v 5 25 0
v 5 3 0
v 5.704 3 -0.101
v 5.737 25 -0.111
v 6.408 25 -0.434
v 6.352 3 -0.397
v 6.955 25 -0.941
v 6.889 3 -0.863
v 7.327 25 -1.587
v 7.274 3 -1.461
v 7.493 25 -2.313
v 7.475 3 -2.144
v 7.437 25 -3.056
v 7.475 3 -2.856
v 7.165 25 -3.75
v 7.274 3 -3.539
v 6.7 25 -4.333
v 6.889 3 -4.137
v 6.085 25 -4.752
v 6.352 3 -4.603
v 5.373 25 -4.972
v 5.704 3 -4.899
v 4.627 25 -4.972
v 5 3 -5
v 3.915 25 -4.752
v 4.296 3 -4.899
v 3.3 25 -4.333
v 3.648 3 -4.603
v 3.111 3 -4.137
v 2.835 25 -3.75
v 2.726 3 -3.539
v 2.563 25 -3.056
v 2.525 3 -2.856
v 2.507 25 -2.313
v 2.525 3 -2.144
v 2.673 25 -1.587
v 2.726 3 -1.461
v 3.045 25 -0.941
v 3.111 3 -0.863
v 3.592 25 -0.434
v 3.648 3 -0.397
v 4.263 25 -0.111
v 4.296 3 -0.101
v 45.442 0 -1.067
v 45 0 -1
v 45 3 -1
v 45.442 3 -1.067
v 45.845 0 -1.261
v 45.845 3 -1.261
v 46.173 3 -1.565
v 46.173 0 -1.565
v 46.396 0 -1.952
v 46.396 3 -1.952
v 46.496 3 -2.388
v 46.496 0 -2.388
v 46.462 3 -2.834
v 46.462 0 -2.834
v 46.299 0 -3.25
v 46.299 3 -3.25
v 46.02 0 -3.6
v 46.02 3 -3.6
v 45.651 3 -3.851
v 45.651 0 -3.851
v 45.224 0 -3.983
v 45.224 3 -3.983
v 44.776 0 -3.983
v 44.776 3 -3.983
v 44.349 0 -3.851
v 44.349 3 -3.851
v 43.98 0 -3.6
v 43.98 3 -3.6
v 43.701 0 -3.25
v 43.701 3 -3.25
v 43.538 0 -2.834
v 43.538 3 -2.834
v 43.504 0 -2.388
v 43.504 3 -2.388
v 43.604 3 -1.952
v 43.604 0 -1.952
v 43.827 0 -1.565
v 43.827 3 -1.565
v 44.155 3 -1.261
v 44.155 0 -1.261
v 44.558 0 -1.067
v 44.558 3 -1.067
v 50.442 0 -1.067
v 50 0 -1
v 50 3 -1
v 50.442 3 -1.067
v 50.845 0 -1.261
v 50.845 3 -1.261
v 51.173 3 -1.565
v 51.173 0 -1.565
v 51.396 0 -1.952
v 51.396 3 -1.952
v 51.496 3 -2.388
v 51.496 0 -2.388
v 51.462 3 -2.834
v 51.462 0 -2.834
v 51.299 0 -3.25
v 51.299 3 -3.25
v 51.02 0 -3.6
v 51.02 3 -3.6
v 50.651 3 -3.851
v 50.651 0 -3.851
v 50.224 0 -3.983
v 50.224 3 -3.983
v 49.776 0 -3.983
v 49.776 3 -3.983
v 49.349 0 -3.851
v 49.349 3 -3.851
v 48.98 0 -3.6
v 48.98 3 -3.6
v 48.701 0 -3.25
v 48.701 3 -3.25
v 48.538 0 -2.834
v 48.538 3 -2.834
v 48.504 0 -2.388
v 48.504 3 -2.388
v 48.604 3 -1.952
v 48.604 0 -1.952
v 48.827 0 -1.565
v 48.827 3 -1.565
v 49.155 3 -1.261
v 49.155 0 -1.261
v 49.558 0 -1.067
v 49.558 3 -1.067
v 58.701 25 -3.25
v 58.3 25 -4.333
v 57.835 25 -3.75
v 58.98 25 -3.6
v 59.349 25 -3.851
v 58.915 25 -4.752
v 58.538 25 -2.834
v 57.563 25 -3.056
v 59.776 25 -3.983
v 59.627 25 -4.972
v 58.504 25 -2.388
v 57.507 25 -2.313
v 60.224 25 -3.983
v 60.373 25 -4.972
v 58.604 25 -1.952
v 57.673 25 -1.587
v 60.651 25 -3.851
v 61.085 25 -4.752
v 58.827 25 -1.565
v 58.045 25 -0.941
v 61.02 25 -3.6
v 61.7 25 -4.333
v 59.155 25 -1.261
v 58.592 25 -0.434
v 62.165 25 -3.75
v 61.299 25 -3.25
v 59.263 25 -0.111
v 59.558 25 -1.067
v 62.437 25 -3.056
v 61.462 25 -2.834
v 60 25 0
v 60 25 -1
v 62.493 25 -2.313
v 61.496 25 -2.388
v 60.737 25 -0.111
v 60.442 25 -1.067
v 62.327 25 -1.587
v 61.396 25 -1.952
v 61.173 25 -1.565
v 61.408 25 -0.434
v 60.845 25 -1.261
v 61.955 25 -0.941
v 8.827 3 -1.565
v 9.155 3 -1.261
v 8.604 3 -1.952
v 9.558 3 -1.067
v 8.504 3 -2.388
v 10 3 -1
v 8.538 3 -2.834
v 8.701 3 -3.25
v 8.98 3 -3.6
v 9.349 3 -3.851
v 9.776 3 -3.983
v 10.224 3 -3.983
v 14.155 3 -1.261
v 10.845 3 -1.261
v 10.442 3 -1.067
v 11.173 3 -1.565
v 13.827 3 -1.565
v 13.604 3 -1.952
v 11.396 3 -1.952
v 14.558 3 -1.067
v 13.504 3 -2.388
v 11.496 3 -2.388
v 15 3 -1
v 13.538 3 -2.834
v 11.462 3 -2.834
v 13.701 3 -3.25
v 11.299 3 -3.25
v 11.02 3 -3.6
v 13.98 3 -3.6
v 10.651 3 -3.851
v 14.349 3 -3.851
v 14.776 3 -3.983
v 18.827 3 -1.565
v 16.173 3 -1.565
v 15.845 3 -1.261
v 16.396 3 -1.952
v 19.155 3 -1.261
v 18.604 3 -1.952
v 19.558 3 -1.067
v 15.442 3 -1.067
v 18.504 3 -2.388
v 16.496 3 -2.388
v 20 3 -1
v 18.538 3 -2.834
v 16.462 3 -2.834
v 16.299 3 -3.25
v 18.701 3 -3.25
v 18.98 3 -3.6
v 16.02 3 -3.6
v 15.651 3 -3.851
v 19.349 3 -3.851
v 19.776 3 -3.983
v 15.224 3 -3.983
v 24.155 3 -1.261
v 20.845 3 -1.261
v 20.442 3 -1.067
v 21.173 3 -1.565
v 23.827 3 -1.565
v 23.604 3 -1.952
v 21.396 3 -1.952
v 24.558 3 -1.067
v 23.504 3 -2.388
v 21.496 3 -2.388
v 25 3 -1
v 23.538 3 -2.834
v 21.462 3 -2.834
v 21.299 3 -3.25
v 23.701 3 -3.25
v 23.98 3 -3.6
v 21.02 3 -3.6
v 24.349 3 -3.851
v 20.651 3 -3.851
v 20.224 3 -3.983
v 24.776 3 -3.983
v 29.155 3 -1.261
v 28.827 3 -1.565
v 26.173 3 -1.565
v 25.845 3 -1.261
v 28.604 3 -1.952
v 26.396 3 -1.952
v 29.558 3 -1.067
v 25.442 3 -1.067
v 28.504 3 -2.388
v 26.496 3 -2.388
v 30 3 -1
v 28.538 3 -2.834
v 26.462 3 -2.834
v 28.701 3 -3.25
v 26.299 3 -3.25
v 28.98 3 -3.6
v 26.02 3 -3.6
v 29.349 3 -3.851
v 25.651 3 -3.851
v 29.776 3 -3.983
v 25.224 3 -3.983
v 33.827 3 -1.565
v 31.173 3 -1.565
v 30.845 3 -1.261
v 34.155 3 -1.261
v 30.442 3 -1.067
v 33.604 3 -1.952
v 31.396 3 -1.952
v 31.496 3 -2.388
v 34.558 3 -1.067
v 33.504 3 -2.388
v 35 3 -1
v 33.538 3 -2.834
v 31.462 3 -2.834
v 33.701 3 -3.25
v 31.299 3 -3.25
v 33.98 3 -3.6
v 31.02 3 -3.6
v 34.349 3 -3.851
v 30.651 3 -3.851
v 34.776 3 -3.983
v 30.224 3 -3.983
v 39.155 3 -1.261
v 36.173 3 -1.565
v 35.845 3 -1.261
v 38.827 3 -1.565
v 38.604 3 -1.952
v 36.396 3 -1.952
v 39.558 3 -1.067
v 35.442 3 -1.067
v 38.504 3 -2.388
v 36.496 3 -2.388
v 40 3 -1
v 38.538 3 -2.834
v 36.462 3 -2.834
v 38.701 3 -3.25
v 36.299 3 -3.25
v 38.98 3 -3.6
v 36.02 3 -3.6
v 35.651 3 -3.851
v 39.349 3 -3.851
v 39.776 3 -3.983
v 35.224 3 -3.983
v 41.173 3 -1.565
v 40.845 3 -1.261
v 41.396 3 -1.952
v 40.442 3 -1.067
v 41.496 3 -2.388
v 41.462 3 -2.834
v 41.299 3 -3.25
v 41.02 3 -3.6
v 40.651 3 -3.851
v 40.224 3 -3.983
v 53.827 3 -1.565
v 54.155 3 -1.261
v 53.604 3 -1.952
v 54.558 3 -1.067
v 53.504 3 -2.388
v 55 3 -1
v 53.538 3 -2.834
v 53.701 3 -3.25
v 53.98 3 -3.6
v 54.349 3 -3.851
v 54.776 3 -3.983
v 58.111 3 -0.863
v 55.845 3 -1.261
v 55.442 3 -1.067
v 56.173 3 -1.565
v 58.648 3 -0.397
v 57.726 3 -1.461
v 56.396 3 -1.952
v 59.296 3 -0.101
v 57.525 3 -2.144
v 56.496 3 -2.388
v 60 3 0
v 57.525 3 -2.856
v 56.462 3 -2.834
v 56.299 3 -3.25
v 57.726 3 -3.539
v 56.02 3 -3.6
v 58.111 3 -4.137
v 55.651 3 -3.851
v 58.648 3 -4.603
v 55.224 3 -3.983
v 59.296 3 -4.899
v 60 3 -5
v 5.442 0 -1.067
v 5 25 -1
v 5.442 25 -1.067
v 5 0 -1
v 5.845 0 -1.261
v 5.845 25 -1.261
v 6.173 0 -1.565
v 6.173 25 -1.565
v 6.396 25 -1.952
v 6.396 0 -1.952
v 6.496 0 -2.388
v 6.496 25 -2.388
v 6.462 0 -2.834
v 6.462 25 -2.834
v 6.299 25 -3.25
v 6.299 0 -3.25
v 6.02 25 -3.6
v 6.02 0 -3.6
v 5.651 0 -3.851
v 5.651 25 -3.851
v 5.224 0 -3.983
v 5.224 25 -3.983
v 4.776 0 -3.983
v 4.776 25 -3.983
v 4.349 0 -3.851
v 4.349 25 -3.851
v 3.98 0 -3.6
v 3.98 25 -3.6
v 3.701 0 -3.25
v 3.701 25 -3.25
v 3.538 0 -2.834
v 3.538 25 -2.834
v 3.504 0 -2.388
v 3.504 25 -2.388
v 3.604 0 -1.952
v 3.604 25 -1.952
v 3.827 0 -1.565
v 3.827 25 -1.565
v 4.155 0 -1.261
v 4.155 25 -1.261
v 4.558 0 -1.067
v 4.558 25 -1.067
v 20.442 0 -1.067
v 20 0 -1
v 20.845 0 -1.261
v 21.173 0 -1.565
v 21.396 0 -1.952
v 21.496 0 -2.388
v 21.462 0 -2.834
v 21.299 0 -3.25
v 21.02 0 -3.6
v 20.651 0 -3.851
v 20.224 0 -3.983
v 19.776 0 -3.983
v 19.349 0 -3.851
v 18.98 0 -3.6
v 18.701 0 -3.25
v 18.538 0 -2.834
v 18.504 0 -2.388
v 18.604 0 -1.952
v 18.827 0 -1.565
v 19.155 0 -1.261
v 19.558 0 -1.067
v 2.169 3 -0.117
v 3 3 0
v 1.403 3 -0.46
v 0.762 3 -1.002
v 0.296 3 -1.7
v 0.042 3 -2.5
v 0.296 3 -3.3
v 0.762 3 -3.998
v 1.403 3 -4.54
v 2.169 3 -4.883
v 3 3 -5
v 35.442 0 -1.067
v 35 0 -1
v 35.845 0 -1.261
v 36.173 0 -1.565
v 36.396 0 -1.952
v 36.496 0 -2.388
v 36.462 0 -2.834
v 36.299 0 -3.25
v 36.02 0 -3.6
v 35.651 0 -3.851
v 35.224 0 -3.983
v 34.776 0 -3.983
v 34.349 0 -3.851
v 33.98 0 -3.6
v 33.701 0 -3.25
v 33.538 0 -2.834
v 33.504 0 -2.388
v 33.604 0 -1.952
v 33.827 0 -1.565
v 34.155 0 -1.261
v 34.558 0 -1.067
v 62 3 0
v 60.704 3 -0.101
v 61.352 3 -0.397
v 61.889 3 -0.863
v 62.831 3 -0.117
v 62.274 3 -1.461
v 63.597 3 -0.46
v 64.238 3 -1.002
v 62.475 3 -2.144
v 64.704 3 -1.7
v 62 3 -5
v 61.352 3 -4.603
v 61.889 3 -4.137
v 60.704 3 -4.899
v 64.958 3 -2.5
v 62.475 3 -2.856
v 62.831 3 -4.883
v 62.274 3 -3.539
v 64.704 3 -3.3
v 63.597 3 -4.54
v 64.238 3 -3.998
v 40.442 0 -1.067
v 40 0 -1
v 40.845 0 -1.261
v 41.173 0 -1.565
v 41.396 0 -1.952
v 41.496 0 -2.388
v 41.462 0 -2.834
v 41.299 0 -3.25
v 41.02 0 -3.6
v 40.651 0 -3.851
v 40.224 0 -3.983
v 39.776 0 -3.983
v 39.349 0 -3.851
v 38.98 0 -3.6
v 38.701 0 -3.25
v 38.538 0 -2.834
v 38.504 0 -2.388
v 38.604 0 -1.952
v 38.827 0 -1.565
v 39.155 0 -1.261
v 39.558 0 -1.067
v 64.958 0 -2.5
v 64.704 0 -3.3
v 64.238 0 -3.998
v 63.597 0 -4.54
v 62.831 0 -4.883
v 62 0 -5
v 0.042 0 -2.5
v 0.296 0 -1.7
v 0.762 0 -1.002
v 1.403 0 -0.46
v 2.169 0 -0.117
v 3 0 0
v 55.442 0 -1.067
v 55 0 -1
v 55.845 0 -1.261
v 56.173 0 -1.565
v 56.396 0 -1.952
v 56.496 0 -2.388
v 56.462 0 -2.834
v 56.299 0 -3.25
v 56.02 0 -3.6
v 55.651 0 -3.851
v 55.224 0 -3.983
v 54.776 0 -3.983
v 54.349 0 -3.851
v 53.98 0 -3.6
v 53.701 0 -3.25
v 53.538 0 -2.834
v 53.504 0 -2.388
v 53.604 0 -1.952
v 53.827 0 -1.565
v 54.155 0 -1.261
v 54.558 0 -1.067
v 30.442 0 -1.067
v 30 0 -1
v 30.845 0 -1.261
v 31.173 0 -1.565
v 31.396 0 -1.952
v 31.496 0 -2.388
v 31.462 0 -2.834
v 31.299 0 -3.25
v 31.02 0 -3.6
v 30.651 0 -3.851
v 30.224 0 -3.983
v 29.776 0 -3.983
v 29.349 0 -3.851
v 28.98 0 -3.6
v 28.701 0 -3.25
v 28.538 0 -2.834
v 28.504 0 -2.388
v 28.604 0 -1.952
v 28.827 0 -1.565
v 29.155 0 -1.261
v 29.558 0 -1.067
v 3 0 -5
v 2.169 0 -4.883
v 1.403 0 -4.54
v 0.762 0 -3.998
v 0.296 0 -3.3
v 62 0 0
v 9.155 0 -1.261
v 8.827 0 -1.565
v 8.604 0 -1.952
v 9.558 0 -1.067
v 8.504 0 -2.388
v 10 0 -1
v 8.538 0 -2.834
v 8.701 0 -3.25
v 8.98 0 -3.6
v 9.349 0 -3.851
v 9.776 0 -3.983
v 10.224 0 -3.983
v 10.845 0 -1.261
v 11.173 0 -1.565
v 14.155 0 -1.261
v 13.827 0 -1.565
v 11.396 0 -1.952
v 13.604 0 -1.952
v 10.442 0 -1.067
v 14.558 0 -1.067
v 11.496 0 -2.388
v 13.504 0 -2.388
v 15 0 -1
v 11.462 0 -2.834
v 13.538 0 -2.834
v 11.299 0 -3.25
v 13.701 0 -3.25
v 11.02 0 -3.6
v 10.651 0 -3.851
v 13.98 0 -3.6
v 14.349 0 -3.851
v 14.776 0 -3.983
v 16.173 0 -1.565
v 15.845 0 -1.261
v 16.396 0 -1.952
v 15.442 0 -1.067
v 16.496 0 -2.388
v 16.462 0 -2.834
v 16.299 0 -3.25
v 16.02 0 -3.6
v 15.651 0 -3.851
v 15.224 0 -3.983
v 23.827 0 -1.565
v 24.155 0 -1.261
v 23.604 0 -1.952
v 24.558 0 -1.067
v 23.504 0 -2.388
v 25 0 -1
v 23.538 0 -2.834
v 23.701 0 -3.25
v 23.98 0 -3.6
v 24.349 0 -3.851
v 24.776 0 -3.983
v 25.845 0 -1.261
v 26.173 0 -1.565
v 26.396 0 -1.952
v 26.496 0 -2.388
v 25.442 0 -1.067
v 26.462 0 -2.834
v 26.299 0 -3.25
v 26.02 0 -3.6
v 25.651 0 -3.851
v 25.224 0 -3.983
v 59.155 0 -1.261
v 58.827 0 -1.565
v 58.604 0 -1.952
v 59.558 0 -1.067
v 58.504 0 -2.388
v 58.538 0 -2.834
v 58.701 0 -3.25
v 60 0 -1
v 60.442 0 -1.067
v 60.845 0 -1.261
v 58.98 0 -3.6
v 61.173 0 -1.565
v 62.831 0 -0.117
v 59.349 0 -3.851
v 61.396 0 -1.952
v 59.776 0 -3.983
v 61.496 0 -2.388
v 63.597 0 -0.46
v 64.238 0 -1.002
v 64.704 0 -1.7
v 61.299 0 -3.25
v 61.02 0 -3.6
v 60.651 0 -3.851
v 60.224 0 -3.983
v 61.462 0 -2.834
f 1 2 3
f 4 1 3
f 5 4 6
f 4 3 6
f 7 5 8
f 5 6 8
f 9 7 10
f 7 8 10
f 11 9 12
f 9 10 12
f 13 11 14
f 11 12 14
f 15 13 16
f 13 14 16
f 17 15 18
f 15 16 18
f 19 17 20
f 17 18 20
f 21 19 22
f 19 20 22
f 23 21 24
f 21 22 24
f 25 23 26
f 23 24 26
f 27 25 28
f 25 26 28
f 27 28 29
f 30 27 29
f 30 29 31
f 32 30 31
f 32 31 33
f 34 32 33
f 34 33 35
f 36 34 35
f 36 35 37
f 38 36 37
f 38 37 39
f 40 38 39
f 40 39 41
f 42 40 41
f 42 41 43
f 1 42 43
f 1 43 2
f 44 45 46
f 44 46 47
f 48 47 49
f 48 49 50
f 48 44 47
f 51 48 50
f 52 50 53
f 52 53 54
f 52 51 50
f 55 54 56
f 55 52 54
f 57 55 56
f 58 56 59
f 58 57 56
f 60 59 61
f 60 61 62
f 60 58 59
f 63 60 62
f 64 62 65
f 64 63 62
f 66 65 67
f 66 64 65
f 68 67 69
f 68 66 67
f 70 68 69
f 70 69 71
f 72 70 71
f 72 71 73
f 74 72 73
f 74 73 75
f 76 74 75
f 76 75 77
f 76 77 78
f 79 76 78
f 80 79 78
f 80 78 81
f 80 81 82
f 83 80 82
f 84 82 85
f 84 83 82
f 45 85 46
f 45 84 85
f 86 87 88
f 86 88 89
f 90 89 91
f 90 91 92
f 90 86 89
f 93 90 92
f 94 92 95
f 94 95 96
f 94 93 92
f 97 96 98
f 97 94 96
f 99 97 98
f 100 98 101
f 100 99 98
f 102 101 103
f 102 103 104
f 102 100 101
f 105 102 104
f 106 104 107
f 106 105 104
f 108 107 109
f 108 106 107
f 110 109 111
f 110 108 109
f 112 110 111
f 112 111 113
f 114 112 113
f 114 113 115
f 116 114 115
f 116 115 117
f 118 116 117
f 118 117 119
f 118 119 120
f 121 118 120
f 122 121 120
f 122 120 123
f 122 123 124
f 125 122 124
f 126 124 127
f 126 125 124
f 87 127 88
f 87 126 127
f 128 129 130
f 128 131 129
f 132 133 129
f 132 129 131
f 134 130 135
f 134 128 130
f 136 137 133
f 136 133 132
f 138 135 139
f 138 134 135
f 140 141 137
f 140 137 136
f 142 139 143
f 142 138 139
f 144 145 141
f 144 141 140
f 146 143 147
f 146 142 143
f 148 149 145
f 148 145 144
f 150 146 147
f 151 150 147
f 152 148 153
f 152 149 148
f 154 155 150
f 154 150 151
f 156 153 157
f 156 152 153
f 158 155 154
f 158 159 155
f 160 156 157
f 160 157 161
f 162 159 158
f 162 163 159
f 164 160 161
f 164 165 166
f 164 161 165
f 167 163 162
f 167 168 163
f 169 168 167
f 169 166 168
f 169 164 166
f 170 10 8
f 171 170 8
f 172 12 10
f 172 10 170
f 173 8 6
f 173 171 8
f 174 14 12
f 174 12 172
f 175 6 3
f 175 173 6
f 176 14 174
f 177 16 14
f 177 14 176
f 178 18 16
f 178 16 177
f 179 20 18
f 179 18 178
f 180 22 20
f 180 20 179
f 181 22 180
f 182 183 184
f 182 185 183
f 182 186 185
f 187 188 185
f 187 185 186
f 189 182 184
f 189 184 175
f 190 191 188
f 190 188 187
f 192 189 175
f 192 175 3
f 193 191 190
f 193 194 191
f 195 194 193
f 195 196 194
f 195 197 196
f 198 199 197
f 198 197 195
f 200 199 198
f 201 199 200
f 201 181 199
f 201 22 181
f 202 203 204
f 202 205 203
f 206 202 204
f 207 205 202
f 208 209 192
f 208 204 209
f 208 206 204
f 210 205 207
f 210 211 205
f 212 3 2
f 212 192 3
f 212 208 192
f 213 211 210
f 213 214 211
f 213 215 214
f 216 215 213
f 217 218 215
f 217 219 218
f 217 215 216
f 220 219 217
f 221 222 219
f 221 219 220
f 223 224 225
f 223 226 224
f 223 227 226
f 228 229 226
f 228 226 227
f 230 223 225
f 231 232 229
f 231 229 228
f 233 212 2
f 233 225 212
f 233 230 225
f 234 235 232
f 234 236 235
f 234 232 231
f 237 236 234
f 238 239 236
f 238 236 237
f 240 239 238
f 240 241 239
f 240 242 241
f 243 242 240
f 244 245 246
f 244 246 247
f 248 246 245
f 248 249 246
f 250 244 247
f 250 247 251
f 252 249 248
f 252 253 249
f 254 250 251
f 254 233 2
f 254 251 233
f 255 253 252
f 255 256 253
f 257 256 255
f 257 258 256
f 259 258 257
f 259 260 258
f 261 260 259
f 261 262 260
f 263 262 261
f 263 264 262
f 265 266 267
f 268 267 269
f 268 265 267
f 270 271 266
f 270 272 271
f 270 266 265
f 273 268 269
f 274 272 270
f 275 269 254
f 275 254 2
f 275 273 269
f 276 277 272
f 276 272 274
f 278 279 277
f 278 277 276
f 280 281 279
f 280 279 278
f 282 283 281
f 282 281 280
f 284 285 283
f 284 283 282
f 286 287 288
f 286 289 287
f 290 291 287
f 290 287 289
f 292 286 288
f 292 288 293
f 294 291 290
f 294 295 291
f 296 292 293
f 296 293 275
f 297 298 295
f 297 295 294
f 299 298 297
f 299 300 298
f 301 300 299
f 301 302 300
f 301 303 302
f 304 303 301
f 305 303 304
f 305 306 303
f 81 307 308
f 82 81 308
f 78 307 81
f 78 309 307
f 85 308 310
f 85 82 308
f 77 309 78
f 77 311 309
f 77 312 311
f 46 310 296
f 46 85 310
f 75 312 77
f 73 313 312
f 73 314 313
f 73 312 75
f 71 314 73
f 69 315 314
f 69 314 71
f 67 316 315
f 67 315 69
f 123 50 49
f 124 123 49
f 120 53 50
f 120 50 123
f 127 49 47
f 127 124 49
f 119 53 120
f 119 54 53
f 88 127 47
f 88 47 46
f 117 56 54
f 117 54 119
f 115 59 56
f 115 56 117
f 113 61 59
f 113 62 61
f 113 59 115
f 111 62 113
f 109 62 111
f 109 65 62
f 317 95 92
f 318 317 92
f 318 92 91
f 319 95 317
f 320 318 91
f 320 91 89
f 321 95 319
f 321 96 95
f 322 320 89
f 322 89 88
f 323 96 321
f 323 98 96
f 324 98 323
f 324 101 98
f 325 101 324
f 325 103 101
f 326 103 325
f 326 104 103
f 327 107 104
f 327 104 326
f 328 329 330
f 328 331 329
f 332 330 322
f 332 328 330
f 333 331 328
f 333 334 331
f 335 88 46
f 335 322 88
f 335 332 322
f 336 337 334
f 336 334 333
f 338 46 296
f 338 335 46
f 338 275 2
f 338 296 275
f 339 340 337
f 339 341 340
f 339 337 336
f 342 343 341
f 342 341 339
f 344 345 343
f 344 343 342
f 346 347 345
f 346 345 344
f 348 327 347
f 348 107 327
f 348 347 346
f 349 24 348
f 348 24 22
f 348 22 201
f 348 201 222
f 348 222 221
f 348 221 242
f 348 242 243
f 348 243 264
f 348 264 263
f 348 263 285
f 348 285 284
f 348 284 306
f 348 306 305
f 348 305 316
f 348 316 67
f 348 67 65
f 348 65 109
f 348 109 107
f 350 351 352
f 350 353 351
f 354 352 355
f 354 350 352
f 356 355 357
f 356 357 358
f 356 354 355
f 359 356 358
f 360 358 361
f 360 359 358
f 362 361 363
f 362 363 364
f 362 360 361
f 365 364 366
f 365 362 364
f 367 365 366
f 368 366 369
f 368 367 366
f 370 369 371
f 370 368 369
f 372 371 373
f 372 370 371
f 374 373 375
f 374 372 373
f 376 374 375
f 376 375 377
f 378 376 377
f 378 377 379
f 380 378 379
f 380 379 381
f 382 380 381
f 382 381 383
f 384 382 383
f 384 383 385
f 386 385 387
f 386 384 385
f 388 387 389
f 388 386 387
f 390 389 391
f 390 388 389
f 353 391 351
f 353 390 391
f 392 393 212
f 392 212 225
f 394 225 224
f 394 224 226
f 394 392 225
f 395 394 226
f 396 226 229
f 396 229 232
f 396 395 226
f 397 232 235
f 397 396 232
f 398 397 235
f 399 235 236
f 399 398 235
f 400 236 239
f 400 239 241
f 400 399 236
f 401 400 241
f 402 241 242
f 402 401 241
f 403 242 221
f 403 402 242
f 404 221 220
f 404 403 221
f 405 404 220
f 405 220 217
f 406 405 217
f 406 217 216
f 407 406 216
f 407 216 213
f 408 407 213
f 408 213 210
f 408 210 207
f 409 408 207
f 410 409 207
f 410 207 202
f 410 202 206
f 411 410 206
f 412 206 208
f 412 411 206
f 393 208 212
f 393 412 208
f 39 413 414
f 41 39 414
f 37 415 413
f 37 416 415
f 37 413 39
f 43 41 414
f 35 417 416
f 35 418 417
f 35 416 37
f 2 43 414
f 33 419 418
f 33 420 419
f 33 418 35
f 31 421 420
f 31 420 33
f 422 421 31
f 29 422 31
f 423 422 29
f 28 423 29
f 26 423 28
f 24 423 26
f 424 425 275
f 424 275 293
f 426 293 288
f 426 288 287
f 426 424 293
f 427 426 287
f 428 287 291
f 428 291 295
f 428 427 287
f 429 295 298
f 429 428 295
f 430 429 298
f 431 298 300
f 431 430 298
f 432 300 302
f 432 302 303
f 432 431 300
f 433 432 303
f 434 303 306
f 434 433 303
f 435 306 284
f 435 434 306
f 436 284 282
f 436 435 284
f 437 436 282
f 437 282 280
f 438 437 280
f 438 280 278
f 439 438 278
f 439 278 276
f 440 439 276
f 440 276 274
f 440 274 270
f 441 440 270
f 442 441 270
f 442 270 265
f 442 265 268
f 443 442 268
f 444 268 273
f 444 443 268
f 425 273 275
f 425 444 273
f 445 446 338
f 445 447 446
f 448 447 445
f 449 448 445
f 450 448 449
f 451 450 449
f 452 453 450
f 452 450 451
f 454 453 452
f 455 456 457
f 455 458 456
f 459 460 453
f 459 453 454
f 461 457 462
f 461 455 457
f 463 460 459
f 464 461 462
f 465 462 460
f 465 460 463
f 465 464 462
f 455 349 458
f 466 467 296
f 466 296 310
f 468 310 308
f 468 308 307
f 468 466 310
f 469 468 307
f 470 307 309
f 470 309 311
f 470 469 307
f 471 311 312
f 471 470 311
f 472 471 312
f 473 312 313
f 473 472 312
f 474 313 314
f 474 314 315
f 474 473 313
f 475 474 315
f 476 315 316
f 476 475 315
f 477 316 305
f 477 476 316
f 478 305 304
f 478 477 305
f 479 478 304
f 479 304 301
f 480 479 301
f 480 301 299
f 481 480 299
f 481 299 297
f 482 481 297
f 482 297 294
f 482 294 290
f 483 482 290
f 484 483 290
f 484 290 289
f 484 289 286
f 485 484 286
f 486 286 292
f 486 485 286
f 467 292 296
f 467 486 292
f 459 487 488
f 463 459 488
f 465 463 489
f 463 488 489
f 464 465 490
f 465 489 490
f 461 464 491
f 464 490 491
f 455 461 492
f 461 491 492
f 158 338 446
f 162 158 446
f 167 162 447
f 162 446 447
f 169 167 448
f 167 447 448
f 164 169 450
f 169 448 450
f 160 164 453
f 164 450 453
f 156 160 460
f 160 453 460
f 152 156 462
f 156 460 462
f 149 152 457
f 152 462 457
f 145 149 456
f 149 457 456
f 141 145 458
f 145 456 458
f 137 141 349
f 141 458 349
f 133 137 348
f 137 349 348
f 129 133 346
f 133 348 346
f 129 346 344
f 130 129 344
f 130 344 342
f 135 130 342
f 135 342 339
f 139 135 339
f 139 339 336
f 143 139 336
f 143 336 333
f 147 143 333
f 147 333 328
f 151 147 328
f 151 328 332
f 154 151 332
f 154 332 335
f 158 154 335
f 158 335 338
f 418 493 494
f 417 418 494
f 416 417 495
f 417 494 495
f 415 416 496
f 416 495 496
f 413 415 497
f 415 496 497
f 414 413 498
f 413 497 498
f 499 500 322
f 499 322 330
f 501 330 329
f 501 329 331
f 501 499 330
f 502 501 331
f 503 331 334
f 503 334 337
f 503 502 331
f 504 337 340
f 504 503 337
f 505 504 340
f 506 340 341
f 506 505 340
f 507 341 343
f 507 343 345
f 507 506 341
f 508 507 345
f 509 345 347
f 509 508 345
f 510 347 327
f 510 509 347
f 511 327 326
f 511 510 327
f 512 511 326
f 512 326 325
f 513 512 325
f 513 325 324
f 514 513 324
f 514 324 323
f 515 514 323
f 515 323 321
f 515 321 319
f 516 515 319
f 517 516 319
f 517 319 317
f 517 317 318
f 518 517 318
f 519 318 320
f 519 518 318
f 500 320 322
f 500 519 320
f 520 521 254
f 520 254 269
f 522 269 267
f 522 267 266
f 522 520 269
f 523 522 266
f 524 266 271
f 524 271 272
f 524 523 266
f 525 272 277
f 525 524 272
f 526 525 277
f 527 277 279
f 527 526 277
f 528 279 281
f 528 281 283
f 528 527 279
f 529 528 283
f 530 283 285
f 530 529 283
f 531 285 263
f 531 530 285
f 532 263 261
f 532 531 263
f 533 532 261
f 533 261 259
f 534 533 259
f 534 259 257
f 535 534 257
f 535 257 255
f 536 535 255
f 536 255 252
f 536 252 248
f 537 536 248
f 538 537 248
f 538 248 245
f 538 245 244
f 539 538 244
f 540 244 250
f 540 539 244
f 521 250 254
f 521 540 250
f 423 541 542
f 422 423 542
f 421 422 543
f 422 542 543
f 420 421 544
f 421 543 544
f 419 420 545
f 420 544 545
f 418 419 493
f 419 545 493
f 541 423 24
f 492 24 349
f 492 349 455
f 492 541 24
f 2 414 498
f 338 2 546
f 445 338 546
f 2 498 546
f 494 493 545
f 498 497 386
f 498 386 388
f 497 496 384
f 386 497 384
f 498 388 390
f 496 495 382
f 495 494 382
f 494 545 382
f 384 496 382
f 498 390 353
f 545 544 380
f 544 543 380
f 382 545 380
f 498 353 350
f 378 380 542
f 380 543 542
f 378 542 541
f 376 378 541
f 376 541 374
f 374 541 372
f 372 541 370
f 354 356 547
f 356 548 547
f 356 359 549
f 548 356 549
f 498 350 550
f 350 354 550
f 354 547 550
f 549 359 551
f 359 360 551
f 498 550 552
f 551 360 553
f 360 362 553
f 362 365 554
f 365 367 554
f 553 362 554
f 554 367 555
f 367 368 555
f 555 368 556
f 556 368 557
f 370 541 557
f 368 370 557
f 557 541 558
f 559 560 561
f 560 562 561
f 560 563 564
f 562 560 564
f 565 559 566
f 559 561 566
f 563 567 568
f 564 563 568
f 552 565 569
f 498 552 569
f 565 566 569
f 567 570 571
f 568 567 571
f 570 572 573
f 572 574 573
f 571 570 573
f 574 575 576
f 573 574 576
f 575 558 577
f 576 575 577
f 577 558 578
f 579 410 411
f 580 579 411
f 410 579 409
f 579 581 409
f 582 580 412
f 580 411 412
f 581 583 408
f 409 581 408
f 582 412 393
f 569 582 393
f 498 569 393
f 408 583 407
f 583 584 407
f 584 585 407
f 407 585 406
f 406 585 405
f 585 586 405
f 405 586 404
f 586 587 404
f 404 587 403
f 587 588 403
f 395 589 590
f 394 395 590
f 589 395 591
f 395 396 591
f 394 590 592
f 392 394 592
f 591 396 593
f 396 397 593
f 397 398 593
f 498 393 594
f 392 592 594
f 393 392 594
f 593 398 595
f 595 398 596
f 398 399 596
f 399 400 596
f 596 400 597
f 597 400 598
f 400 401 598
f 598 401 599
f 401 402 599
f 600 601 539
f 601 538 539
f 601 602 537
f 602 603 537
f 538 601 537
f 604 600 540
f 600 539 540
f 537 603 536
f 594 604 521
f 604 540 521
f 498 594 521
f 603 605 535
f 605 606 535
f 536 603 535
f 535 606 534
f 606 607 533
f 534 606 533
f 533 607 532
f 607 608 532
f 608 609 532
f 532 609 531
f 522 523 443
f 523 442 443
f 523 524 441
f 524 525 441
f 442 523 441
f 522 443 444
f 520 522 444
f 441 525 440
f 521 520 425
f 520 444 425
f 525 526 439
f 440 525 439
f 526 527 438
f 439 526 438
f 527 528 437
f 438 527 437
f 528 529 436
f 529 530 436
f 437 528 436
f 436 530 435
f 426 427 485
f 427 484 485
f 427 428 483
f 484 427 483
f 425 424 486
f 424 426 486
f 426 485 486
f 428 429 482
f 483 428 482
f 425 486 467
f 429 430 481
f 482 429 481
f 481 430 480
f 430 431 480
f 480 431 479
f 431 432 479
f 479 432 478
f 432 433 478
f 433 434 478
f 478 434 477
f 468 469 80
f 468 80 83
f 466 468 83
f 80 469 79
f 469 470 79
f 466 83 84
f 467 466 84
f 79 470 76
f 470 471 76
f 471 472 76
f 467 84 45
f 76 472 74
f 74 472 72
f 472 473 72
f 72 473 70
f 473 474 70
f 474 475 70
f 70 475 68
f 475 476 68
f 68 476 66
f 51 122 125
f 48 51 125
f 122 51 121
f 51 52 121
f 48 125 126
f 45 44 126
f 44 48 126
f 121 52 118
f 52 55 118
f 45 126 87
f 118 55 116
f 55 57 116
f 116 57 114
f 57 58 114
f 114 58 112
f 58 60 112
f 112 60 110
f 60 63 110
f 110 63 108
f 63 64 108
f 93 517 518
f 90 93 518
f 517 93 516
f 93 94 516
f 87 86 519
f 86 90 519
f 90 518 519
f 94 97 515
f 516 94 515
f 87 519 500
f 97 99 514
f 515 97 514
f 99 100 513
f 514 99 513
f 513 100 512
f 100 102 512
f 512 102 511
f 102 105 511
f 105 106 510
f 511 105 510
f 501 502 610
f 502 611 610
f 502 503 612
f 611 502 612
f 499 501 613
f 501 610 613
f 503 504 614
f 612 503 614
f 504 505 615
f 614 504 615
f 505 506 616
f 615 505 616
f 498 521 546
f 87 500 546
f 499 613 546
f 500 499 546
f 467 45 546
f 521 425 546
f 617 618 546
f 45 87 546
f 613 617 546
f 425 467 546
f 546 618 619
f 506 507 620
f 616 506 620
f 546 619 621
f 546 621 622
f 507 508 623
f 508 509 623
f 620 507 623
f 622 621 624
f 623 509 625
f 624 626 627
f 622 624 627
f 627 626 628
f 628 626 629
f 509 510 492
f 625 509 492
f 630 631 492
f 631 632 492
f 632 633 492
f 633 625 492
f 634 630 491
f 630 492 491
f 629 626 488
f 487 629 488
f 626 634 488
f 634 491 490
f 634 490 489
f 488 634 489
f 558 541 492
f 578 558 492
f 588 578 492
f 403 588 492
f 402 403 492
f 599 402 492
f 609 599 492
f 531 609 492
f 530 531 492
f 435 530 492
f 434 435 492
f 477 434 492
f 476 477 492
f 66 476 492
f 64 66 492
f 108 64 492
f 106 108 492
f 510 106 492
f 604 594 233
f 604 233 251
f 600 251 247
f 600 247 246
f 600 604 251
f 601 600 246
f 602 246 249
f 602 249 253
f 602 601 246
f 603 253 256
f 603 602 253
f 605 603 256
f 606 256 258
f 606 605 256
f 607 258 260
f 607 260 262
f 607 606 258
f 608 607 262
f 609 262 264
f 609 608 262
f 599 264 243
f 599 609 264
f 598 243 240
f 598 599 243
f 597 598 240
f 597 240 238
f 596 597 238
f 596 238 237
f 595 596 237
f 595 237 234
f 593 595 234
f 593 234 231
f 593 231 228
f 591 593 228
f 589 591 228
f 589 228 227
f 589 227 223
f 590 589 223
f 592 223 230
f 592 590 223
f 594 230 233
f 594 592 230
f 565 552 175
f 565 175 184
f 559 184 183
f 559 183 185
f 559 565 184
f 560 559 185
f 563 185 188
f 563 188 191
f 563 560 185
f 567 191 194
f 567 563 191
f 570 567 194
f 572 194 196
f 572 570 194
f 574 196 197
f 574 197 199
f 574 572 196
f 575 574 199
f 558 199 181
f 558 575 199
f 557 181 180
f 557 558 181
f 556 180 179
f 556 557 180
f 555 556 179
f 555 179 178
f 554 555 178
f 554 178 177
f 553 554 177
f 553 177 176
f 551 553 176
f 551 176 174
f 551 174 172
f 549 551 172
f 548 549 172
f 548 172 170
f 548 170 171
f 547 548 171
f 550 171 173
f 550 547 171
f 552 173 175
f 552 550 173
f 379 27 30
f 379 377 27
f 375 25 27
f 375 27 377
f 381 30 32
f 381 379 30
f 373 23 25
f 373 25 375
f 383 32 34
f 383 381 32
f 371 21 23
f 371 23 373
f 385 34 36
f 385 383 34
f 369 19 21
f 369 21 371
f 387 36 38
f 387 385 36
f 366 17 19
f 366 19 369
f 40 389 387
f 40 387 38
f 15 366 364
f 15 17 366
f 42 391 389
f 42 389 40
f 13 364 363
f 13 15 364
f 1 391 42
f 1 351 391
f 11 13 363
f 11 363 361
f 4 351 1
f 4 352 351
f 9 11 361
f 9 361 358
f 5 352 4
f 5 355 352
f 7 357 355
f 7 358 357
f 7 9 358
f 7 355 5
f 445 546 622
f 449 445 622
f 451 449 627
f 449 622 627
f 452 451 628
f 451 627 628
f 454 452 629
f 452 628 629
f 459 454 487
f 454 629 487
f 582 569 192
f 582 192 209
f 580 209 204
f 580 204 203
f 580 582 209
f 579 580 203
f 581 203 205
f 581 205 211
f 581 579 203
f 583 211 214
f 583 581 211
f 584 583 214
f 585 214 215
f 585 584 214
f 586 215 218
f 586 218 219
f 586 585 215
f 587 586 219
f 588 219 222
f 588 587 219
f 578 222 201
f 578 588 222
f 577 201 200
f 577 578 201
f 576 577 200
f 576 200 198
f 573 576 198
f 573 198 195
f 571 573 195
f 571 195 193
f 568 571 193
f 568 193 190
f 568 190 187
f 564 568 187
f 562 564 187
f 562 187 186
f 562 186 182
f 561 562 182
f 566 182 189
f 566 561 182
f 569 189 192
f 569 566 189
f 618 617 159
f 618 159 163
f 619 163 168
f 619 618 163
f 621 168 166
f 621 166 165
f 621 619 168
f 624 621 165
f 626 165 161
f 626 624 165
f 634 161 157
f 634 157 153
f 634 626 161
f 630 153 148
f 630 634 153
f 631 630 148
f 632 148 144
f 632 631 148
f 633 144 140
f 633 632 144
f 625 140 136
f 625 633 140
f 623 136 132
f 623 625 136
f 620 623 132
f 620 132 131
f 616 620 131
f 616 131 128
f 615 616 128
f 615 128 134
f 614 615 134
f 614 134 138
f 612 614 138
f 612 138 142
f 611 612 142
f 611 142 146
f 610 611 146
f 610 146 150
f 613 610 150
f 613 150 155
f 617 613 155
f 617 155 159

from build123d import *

# Parameters (mm, degrees)
SKETCH1_W           = 65
SKETCH1_H           = 5
SKETCH1_R           = 1.5
BOSS_EXTRUDE1_DEPTH = 3
SKETCH2_R           = 2.5
SKETCH2_R_2         = 1.5
BOSS_EXTRUDE2_DEPTH = 22
FILLET1_R           = 3


with BuildPart() as part:
    # Sketch1 → Boss-Extrude1 (new body)
    with BuildSketch(Plane(origin=(0, 0, 0), x_dir=(1, 0, 0), z_dir=(0, 1, 0))):
        with Locations((32.5, 2.5)):
            Rectangle(SKETCH1_W, SKETCH1_H)
        with Locations(Location((5, 2.5, 0), (0, 0, 270))):
            Circle(SKETCH1_R, mode=Mode.SUBTRACT)
        with Locations(Location((10, 2.5, 0), (0, 0, 270))):
            Circle(SKETCH1_R, mode=Mode.SUBTRACT)
        with Locations(Location((15, 2.5, 0), (0, 0, 270))):
            Circle(SKETCH1_R, mode=Mode.SUBTRACT)
        with Locations(Location((20, 2.5, 0), (0, 0, 270))):
            Circle(SKETCH1_R, mode=Mode.SUBTRACT)
        with Locations(Location((25, 2.5, 0), (0, 0, 270))):
            Circle(SKETCH1_R, mode=Mode.SUBTRACT)
        with Locations(Location((30, 2.5, 0), (0, 0, 270))):
            Circle(SKETCH1_R, mode=Mode.SUBTRACT)
        with Locations(Location((35, 2.5, 0), (0, 0, 270))):
            Circle(SKETCH1_R, mode=Mode.SUBTRACT)
        with Locations(Location((40, 2.5, 0), (0, 0, 270))):
            Circle(SKETCH1_R, mode=Mode.SUBTRACT)
        with Locations(Location((45, 2.5, 0), (0, 0, 270))):
            Circle(SKETCH1_R, mode=Mode.SUBTRACT)
        with Locations(Location((50, 2.5, 0), (0, 0, 270))):
            Circle(SKETCH1_R, mode=Mode.SUBTRACT)
        with Locations(Location((55, 2.5, 0), (0, 0, 270))):
            Circle(SKETCH1_R, mode=Mode.SUBTRACT)
        with Locations(Location((60, 2.5, 0), (0, 0, 270))):
            Circle(SKETCH1_R, mode=Mode.SUBTRACT)
    extrude(amount=BOSS_EXTRUDE1_DEPTH)

    # Sketch2 → Boss-Extrude2 (add)
    # profile 1 of 2: a face of its own
    with BuildSketch(Plane(origin=(0, 3, 0), x_dir=(1, 0, 0), z_dir=(0, 1, 0))):
        with Locations(Location((5, 2.5, 0), (0, 0, 270))):
            Circle(SKETCH2_R)
        with Locations(Location((5, 2.5, 0), (0, 0, 270))):
            Circle(SKETCH2_R_2, mode=Mode.SUBTRACT)
    # profile 2 of 2: a face of its own
    with BuildSketch(Plane(origin=(0, 3, 0), x_dir=(1, 0, 0), z_dir=(0, 1, 0))):
        with Locations(Location((60, 2.5, 0), (0, 0, 270))):
            Circle(SKETCH2_R)
        with Locations(Location((60, 2.5, 0), (0, 0, 270))):
            Circle(SKETCH2_R_2, mode=Mode.SUBTRACT)
    extrude(amount=BOSS_EXTRUDE2_DEPTH)

    # Fillet1
    # the kernel refuses this fillet: 3 mm, written as the material it takes off along each edge
    with BuildSketch(Plane(origin=(65, -7.5, -5), x_dir=(-1, 0, 0), z_dir=(0, 1, 0)), Plane(origin=(0, -7.5, 0), x_dir=(1, 0, 0), z_dir=(0, 1, 0))) as fillet1_piece_1:
        with BuildLine():
            CenterArc((FILLET1_R, FILLET1_R), FILLET1_R, 180, 90)
            Line((0, FILLET1_R), (0, 0))
            Line((0, 0), (FILLET1_R, 0))
        make_face()
    extrude(amount=18, mode=Mode.SUBTRACT)
    with BuildSketch(Plane(origin=(65, -7.5, 0), x_dir=(-1, 0, 0), z_dir=(0, 1, 0)), Plane(origin=(0, -7.5, -5), x_dir=(1, 0, 0), z_dir=(0, 1, 0))) as fillet1_piece_2:
        with BuildLine():
            CenterArc((FILLET1_R, -FILLET1_R), FILLET1_R, 90, 90)
            Line((0, -FILLET1_R), (0, 0))
            Line((0, 0), (FILLET1_R, 0))
        make_face()
    extrude(amount=18, mode=Mode.SUBTRACT)


solid = part.part
